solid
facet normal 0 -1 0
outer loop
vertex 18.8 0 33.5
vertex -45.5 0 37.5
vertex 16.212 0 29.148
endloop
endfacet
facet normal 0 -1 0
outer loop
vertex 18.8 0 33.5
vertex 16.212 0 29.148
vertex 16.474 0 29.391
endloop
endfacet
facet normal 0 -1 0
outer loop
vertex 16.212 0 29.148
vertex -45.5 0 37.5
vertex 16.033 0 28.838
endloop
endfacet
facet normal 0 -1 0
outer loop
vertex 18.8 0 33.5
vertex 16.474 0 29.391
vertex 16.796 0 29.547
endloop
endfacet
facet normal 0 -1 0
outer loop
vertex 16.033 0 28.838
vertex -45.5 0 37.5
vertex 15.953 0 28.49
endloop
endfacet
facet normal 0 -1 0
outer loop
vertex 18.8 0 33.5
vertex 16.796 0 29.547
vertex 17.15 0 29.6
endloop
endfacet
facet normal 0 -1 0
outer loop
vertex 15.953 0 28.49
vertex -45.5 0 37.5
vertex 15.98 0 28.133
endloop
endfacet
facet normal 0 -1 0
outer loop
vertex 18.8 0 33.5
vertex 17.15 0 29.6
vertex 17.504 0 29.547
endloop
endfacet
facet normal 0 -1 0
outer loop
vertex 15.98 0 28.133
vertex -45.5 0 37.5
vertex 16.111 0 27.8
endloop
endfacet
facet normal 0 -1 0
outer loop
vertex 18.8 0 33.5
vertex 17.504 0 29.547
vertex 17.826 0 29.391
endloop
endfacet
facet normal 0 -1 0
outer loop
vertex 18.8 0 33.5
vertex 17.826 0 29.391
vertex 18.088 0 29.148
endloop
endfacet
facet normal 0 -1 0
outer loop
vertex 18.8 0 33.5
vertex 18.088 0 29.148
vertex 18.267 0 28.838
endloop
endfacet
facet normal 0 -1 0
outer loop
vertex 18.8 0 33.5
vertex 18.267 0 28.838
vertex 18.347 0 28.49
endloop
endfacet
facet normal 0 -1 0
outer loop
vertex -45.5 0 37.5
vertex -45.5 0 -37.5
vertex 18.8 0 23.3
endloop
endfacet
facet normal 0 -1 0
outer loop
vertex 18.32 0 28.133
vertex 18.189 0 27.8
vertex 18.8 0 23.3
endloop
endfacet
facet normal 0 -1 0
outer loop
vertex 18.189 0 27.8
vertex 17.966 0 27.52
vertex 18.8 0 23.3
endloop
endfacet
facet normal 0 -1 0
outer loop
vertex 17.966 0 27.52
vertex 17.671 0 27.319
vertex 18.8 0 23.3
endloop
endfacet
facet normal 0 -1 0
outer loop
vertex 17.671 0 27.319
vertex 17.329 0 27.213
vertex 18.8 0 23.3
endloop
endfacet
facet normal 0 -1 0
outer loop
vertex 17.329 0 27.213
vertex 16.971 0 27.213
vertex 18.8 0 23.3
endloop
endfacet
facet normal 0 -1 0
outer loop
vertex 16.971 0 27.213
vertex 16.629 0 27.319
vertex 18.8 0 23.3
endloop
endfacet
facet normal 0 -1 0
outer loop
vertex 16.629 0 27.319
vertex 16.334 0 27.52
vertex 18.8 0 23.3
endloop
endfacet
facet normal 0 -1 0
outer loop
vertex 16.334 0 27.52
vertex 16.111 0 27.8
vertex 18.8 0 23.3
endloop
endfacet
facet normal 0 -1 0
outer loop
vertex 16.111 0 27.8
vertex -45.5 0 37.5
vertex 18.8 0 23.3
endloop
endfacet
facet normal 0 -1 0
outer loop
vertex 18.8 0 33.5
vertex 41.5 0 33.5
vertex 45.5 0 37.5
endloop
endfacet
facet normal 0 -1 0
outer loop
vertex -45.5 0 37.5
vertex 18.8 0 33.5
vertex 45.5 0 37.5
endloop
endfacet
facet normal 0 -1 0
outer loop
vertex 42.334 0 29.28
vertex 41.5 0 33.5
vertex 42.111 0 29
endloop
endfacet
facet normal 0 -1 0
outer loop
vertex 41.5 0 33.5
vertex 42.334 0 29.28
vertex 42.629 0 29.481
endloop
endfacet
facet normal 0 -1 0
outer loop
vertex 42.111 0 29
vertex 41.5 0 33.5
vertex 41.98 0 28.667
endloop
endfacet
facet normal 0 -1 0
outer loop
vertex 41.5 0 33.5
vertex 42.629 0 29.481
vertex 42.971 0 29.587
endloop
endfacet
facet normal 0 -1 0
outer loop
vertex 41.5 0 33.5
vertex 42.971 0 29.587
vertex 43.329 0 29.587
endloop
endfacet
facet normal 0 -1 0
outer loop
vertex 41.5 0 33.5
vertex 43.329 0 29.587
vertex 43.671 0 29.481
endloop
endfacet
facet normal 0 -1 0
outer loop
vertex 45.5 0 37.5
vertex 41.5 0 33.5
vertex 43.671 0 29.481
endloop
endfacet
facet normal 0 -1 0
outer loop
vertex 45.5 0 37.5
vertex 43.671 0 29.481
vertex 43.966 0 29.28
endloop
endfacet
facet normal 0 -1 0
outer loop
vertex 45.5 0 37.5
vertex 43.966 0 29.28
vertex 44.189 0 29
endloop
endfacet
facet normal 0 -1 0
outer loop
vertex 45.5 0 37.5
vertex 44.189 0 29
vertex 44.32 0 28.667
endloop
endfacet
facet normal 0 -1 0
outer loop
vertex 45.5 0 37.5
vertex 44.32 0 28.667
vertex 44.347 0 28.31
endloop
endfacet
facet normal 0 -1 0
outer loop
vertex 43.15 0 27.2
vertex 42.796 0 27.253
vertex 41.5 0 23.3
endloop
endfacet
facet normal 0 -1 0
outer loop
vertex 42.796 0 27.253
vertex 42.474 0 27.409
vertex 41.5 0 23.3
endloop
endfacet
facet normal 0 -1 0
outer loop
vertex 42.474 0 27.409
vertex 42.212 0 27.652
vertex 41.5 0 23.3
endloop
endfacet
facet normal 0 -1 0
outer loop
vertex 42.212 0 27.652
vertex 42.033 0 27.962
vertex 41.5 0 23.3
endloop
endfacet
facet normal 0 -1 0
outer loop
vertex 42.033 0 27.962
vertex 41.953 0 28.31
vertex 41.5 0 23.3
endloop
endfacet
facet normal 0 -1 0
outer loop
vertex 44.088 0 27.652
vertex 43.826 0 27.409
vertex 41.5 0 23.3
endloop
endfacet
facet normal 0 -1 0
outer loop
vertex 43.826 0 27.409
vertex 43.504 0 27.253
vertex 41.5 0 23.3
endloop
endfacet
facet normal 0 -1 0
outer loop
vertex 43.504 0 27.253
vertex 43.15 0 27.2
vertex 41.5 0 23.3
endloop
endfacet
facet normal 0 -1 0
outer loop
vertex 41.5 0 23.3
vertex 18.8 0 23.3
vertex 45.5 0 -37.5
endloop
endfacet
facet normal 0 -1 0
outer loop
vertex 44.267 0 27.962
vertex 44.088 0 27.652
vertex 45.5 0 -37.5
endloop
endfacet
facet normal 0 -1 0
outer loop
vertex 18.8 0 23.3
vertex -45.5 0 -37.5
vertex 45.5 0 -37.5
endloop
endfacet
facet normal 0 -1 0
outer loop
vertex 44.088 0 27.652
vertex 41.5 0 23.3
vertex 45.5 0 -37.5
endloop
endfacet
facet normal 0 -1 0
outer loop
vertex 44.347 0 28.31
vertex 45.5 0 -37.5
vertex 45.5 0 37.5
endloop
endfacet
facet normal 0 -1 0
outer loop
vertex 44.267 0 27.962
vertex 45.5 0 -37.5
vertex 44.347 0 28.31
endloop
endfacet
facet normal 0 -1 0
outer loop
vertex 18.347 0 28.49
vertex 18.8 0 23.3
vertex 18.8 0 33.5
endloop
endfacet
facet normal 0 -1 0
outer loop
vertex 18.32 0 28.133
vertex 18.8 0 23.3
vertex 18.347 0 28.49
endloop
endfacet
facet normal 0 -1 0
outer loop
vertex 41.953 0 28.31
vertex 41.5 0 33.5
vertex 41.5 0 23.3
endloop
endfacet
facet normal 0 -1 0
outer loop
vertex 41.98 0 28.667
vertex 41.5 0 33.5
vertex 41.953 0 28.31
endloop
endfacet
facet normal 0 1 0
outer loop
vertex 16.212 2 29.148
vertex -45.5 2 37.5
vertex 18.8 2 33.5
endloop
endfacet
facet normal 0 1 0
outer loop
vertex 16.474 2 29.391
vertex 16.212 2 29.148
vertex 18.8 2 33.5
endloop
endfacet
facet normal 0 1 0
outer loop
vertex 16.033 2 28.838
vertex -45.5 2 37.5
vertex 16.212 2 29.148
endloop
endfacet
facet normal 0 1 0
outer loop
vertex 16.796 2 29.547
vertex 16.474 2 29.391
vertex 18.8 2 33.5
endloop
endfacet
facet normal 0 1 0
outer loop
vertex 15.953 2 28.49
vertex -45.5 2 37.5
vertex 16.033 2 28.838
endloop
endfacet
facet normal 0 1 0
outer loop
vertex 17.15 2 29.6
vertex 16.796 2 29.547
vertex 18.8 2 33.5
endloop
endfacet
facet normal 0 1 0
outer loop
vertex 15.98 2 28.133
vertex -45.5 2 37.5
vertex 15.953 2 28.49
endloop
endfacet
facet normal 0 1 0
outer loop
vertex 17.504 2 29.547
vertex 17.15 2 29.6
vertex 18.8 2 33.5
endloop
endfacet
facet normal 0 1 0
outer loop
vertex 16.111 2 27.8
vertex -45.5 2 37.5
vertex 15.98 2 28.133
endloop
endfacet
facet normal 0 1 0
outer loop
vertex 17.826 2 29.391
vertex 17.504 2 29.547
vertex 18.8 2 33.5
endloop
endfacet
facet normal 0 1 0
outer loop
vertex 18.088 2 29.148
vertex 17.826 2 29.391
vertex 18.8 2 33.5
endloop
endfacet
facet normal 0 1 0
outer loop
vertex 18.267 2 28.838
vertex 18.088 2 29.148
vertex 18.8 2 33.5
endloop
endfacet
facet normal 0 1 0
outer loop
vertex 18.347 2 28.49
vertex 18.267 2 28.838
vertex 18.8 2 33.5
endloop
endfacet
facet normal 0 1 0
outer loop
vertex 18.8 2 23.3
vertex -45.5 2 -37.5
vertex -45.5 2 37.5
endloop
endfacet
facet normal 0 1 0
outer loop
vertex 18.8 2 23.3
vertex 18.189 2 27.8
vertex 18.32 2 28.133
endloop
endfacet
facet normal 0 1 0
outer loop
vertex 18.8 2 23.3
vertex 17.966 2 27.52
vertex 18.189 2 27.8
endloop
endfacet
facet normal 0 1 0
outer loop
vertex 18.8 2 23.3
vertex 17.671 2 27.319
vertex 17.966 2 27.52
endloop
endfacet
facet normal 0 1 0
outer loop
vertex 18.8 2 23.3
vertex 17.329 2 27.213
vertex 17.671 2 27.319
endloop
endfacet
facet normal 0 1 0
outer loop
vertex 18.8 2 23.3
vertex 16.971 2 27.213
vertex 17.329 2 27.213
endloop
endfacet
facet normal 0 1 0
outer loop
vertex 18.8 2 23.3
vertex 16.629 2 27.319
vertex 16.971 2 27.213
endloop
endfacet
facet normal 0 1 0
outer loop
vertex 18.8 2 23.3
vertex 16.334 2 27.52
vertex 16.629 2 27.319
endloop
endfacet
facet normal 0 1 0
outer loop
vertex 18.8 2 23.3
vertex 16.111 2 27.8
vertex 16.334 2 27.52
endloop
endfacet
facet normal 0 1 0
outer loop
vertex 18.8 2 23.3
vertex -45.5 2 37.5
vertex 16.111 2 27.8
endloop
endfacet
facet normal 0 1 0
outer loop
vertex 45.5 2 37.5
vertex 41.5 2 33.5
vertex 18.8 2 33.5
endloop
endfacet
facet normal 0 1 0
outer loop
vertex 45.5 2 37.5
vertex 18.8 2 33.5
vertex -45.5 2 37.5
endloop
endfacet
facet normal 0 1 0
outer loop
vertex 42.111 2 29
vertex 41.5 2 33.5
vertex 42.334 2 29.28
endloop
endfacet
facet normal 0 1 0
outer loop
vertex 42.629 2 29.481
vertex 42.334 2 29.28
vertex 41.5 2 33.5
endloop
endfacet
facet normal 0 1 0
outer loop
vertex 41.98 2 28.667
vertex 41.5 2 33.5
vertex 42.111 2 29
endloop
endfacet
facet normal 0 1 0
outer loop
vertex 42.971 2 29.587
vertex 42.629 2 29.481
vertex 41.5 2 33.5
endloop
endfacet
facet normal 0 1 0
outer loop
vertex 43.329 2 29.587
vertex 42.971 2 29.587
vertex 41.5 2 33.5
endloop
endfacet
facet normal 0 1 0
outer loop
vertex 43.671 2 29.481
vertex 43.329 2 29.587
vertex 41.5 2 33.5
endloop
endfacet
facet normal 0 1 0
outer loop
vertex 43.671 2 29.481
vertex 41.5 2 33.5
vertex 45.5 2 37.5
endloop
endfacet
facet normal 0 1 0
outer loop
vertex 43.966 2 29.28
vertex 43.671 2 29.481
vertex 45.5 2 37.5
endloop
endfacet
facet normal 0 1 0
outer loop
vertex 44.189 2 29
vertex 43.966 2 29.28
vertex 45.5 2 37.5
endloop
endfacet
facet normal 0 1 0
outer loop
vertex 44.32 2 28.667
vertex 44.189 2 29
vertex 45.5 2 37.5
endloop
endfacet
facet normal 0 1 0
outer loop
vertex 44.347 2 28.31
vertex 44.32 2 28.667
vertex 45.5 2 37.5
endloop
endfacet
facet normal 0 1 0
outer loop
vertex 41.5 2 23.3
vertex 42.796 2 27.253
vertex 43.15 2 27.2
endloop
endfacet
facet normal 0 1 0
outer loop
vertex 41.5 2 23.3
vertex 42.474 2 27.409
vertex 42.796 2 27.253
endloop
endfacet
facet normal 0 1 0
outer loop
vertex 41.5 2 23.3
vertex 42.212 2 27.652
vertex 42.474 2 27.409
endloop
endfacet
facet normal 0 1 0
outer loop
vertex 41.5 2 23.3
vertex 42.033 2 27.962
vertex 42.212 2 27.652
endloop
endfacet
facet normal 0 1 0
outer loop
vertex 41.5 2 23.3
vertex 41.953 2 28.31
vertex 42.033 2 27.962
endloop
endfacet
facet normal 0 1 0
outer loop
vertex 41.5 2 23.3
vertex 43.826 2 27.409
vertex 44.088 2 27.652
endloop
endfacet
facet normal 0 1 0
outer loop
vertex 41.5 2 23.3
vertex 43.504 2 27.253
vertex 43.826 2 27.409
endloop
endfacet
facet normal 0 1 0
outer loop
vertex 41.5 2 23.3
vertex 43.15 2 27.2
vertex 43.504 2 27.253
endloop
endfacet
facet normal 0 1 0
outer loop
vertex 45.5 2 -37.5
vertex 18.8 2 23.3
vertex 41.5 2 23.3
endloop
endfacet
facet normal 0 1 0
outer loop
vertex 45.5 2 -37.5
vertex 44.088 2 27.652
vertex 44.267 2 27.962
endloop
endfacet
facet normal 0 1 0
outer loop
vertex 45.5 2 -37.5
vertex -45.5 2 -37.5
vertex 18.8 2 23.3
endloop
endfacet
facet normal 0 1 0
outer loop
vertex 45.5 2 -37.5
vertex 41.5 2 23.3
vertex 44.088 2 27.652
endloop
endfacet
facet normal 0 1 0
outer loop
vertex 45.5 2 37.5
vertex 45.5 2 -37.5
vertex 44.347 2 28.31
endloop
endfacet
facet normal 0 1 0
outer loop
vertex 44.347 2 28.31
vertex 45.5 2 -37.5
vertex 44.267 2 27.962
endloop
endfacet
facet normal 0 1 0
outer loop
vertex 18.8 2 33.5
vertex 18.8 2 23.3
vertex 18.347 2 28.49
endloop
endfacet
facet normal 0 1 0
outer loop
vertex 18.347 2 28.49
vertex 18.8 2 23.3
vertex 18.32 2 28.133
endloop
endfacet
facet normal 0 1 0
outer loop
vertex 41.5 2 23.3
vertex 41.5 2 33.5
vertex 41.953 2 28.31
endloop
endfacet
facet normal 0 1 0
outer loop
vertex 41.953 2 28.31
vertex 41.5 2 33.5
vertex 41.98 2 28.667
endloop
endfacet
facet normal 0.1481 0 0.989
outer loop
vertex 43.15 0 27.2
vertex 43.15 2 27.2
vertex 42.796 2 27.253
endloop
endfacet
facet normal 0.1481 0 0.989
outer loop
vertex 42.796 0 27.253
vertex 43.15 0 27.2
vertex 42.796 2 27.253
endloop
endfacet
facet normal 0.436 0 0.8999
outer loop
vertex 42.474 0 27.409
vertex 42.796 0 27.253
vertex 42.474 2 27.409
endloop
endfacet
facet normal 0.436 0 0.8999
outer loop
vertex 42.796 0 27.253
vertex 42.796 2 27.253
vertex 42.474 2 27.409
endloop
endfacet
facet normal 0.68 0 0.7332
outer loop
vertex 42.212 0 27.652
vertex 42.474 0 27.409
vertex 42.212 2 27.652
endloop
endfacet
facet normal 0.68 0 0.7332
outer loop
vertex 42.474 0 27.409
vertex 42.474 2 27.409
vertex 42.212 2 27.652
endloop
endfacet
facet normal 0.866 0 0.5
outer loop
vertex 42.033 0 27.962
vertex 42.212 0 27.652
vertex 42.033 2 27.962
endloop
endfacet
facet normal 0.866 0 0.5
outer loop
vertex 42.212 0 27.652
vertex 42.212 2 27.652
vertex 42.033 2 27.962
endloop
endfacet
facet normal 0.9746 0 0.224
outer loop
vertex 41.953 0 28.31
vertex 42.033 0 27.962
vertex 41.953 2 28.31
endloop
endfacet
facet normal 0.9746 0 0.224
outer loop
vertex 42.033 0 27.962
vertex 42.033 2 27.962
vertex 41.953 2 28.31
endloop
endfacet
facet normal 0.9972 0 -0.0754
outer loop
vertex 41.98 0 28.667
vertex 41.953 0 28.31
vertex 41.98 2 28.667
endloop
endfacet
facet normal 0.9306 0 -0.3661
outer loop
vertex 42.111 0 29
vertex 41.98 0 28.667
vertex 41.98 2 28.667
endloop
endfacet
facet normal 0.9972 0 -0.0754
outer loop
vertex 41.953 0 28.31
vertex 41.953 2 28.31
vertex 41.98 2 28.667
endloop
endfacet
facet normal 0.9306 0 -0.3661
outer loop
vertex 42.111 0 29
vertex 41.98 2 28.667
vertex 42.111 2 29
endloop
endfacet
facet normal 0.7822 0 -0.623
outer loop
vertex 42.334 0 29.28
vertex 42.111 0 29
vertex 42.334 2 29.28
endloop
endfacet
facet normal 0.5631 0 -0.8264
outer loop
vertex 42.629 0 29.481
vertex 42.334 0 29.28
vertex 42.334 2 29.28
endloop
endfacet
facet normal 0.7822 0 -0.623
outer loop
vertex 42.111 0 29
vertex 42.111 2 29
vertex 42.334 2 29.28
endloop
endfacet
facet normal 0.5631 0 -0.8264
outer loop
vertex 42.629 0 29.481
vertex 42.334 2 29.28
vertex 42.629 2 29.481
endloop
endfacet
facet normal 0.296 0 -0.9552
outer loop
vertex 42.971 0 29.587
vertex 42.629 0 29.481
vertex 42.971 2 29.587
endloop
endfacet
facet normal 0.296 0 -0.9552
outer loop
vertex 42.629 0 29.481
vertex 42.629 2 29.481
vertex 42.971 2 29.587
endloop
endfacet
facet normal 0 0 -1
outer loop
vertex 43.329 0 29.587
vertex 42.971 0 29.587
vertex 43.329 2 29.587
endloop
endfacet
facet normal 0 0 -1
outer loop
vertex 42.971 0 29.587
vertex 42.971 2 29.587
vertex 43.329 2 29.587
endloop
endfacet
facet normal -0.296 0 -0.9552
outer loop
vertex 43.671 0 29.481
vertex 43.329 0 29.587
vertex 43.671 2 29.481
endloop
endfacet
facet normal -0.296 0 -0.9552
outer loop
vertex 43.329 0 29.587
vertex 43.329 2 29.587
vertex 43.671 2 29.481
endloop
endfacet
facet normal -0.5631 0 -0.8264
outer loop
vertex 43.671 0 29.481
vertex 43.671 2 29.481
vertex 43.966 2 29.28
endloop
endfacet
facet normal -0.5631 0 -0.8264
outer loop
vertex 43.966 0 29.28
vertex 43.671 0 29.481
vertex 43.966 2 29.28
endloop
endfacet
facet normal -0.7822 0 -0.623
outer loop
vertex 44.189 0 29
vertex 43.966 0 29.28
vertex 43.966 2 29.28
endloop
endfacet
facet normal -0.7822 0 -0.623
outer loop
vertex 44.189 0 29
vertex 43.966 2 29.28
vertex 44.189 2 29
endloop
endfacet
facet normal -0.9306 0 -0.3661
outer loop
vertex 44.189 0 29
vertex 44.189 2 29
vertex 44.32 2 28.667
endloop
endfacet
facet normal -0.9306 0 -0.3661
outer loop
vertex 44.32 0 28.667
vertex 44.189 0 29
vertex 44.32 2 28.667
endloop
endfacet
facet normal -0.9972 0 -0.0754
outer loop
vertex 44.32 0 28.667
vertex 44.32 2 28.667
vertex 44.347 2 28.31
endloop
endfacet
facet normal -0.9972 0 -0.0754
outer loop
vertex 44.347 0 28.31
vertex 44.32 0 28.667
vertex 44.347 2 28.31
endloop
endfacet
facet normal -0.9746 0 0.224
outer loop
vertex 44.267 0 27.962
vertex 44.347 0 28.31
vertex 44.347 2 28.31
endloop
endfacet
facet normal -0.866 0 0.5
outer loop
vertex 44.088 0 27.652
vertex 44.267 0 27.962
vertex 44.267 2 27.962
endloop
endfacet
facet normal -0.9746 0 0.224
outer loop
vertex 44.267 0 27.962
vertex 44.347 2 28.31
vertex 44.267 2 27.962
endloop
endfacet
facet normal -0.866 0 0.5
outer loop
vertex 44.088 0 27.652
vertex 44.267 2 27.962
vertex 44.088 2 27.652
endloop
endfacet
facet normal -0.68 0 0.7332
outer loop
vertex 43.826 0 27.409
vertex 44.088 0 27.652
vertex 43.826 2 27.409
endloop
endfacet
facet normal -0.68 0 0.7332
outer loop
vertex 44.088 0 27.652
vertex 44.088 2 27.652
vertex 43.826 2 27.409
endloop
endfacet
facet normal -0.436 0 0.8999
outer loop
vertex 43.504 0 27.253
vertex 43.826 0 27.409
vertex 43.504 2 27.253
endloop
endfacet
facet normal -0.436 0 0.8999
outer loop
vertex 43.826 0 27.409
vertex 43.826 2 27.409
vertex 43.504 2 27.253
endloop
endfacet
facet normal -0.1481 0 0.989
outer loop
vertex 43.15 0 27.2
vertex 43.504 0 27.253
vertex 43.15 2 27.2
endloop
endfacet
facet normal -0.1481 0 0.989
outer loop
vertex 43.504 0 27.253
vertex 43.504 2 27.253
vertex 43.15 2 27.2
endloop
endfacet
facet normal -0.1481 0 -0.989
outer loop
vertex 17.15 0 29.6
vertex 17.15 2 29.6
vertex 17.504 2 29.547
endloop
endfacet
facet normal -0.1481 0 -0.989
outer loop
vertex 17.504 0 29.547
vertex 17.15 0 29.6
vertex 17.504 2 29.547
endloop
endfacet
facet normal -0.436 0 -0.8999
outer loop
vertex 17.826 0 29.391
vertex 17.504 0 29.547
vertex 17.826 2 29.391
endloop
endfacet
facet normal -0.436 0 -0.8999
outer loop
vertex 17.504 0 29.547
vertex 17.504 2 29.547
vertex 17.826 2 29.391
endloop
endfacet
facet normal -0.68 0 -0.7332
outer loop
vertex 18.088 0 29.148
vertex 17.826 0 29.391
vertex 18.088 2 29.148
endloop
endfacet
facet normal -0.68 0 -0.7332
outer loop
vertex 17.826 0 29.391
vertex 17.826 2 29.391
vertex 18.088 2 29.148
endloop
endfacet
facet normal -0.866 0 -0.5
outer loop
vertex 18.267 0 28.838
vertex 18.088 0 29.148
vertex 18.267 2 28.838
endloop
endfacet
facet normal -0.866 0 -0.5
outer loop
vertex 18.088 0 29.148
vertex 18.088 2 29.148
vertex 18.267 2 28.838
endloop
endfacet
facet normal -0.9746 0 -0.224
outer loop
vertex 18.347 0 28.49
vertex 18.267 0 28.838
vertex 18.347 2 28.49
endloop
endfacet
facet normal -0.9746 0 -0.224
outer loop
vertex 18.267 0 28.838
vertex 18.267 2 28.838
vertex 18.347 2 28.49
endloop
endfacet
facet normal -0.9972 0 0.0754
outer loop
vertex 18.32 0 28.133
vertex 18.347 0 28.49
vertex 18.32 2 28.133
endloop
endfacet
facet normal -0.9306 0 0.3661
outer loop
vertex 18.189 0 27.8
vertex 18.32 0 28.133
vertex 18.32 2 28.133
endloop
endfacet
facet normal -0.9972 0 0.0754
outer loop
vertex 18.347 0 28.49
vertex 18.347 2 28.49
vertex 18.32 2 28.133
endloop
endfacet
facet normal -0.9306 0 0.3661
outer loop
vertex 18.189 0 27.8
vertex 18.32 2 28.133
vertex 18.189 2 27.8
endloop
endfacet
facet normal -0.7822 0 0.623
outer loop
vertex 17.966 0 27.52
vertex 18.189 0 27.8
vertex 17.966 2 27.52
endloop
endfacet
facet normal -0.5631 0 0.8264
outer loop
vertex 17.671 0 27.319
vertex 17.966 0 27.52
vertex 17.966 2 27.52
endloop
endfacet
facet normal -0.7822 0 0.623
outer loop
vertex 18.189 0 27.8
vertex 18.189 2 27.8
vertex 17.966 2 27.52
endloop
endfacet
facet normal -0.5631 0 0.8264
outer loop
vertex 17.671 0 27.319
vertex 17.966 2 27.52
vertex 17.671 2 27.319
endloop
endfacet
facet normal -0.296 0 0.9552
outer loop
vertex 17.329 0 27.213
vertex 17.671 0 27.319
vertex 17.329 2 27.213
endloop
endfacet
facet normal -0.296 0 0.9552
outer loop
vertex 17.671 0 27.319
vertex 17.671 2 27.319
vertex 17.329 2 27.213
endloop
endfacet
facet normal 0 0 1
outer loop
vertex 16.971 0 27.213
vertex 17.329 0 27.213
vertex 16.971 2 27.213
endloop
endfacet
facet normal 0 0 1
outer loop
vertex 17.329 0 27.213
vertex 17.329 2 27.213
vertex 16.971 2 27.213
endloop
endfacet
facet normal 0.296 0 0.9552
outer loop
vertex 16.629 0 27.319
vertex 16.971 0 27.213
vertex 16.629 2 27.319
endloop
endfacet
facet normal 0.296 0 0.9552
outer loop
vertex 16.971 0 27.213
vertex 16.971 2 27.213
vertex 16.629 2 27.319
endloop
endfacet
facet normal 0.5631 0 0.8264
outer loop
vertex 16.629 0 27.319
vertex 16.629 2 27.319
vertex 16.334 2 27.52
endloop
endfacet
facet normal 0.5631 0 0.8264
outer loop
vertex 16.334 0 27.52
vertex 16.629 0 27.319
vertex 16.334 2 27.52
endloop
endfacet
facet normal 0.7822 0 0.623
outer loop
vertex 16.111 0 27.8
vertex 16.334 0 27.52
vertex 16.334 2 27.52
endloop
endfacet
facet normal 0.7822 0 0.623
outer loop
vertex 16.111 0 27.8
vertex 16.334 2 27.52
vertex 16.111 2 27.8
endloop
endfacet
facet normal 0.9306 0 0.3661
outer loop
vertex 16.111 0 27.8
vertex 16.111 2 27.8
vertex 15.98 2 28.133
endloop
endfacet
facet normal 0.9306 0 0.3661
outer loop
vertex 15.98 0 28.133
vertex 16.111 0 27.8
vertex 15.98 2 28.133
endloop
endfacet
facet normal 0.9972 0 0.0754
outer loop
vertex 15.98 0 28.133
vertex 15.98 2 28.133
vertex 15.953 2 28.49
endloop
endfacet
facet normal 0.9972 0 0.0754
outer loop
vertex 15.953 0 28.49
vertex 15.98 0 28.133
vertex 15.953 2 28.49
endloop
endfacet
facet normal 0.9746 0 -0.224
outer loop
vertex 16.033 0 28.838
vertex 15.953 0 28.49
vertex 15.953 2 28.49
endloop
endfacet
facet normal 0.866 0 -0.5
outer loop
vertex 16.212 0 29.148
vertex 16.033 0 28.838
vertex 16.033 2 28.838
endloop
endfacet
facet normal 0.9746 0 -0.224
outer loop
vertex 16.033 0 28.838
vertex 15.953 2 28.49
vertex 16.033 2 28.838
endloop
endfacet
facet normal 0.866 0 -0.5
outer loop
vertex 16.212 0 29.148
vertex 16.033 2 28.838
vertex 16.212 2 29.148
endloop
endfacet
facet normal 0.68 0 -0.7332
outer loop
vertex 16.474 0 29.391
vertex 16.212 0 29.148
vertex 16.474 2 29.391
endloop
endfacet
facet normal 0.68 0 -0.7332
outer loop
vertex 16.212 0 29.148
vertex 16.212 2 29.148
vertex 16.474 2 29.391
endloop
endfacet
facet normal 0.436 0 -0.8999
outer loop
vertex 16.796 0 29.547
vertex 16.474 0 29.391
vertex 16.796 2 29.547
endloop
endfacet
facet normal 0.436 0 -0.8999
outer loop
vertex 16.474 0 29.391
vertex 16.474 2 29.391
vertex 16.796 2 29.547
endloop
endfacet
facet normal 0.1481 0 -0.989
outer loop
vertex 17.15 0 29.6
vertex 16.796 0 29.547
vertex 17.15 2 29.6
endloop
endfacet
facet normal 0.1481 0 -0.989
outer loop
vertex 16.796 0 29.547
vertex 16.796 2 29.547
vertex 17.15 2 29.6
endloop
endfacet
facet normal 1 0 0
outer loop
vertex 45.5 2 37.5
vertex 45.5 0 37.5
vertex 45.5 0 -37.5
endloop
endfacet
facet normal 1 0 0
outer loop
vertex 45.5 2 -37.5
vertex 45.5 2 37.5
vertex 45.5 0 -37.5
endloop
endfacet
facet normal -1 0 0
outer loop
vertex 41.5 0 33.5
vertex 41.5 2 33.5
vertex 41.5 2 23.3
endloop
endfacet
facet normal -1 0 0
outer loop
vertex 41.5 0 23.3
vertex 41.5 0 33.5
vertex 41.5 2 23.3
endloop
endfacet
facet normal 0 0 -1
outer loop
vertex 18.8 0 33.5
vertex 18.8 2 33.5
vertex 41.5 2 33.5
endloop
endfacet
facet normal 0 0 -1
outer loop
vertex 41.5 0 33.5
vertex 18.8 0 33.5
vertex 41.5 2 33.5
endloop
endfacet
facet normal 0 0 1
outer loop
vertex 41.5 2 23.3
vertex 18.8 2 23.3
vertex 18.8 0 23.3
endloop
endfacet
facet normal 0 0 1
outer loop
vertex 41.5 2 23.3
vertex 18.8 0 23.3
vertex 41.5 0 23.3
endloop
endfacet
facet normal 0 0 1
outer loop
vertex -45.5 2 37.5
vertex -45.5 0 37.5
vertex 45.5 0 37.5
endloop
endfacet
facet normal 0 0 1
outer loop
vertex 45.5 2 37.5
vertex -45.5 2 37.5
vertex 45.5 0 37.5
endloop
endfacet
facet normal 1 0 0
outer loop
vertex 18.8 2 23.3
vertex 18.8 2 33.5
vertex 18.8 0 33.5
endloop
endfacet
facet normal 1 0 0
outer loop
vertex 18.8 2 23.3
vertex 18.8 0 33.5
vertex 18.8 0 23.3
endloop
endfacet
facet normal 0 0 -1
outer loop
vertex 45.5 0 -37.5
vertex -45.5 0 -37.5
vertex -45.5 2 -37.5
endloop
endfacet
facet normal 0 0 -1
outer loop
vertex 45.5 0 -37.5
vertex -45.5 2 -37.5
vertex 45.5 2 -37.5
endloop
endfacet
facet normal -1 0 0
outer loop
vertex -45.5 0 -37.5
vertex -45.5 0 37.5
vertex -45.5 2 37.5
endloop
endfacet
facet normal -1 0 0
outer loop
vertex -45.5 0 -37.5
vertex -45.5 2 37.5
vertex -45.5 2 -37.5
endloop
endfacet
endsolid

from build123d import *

# Parameters (mm, degrees)
SKETCH_1_W          = 91
SKETCH_1_H          = 75
EXTRUDE_1_DEPTH     = 2
SKETCH_2_R          = 1.2
SKETCH_2_W          = 22.7
SKETCH_2_H          = 10.2
CUT_EXTRUDE_1_DEPTH = 2


with BuildPart() as part:
    # 草图1 → 凸台-拉伸1 (new body)
    with BuildSketch(Plane(origin=(0, 0, 0), x_dir=(1, 0, 0), z_dir=(0, 1, 0))):
        Rectangle(SKETCH_1_W, SKETCH_1_H)
    extrude(amount=EXTRUDE_1_DEPTH)

    # 草图2 → 切除-拉伸1 (cut)
    with BuildSketch(Plane(origin=(0, 2, 0), x_dir=(1, 0, 0), z_dir=(0, 1, 0))):
        with Locations(Location((17.15, -28.4, 0), (0, 0, 270))):
            Circle(SKETCH_2_R)
        with Locations(Location((43.15, -28.4, 0), (0, 0, 90))):
            Circle(SKETCH_2_R)
        with Locations((30.15, -28.4)):
            Rectangle(SKETCH_2_W, SKETCH_2_H)
    extrude(amount=-CUT_EXTRUDE_1_DEPTH, mode=Mode.SUBTRACT)


solid = part.part
